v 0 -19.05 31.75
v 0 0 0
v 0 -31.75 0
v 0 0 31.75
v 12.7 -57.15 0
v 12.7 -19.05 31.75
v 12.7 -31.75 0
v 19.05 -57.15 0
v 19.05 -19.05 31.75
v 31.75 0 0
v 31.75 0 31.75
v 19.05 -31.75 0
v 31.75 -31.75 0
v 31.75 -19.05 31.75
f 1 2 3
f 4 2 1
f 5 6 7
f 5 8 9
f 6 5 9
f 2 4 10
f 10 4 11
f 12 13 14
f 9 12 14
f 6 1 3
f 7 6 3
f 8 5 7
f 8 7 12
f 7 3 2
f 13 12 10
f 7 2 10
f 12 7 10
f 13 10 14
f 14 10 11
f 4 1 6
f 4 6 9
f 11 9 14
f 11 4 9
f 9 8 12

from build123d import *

# Parameters (mm, degrees)
F0_W     = 31.75
F0_H     = 31.75
F1_DEPTH = 57.15
F3_DEPTH = 12.7
F5_DEPTH = 12.7
F7_DEPTH = 12.7
F9_DEPTH = 12.7


with BuildPart() as f1:
    # F0 (on Front) → F1 (new body)
    with BuildSketch(Plane.XZ):
        with Locations((15.875, 15.875)):
            Rectangle(F0_W, F0_H)
    extrude(amount=F1_DEPTH)

    # F2 (on face) → F3 (cut)
    with BuildSketch(Plane(origin=(0, 0, 0), x_dir=(0, -1, 0), z_dir=(-1, 0, 0))):
        Polygon((57.15, 31.75), (19.05, 31.75), (31.75, 0), (57.15, 0), align=None)
    extrude(amount=-F3_DEPTH, mode=Mode.SUBTRACT)

    # F4 (on face) → F5 (cut)
    with BuildSketch(Plane.YZ.offset(19.05)):
        Polygon((-57.15, 0), (-19.05, 31.75), (-57.15, 31.75), align=None)
    extrude(amount=-F5_DEPTH, mode=Mode.SUBTRACT)

    # F6 (on face) → F7 (cut)
    with BuildSketch(Plane.YZ.offset(31.75)):
        Polygon((-57.15, 31.75), (-57.15, 0), (-19.05, 31.75), align=None)
    extrude(amount=-F7_DEPTH, mode=Mode.SUBTRACT)

    # F8 (on face) → F9 (cut)
    with BuildSketch(Plane.YZ.offset(31.75)):
        Polygon((-31.75, 0), (-19.05, 31.75), (-57.15, 0), align=None)
    extrude(amount=-F9_DEPTH, mode=Mode.SUBTRACT)


solid = f1.part
